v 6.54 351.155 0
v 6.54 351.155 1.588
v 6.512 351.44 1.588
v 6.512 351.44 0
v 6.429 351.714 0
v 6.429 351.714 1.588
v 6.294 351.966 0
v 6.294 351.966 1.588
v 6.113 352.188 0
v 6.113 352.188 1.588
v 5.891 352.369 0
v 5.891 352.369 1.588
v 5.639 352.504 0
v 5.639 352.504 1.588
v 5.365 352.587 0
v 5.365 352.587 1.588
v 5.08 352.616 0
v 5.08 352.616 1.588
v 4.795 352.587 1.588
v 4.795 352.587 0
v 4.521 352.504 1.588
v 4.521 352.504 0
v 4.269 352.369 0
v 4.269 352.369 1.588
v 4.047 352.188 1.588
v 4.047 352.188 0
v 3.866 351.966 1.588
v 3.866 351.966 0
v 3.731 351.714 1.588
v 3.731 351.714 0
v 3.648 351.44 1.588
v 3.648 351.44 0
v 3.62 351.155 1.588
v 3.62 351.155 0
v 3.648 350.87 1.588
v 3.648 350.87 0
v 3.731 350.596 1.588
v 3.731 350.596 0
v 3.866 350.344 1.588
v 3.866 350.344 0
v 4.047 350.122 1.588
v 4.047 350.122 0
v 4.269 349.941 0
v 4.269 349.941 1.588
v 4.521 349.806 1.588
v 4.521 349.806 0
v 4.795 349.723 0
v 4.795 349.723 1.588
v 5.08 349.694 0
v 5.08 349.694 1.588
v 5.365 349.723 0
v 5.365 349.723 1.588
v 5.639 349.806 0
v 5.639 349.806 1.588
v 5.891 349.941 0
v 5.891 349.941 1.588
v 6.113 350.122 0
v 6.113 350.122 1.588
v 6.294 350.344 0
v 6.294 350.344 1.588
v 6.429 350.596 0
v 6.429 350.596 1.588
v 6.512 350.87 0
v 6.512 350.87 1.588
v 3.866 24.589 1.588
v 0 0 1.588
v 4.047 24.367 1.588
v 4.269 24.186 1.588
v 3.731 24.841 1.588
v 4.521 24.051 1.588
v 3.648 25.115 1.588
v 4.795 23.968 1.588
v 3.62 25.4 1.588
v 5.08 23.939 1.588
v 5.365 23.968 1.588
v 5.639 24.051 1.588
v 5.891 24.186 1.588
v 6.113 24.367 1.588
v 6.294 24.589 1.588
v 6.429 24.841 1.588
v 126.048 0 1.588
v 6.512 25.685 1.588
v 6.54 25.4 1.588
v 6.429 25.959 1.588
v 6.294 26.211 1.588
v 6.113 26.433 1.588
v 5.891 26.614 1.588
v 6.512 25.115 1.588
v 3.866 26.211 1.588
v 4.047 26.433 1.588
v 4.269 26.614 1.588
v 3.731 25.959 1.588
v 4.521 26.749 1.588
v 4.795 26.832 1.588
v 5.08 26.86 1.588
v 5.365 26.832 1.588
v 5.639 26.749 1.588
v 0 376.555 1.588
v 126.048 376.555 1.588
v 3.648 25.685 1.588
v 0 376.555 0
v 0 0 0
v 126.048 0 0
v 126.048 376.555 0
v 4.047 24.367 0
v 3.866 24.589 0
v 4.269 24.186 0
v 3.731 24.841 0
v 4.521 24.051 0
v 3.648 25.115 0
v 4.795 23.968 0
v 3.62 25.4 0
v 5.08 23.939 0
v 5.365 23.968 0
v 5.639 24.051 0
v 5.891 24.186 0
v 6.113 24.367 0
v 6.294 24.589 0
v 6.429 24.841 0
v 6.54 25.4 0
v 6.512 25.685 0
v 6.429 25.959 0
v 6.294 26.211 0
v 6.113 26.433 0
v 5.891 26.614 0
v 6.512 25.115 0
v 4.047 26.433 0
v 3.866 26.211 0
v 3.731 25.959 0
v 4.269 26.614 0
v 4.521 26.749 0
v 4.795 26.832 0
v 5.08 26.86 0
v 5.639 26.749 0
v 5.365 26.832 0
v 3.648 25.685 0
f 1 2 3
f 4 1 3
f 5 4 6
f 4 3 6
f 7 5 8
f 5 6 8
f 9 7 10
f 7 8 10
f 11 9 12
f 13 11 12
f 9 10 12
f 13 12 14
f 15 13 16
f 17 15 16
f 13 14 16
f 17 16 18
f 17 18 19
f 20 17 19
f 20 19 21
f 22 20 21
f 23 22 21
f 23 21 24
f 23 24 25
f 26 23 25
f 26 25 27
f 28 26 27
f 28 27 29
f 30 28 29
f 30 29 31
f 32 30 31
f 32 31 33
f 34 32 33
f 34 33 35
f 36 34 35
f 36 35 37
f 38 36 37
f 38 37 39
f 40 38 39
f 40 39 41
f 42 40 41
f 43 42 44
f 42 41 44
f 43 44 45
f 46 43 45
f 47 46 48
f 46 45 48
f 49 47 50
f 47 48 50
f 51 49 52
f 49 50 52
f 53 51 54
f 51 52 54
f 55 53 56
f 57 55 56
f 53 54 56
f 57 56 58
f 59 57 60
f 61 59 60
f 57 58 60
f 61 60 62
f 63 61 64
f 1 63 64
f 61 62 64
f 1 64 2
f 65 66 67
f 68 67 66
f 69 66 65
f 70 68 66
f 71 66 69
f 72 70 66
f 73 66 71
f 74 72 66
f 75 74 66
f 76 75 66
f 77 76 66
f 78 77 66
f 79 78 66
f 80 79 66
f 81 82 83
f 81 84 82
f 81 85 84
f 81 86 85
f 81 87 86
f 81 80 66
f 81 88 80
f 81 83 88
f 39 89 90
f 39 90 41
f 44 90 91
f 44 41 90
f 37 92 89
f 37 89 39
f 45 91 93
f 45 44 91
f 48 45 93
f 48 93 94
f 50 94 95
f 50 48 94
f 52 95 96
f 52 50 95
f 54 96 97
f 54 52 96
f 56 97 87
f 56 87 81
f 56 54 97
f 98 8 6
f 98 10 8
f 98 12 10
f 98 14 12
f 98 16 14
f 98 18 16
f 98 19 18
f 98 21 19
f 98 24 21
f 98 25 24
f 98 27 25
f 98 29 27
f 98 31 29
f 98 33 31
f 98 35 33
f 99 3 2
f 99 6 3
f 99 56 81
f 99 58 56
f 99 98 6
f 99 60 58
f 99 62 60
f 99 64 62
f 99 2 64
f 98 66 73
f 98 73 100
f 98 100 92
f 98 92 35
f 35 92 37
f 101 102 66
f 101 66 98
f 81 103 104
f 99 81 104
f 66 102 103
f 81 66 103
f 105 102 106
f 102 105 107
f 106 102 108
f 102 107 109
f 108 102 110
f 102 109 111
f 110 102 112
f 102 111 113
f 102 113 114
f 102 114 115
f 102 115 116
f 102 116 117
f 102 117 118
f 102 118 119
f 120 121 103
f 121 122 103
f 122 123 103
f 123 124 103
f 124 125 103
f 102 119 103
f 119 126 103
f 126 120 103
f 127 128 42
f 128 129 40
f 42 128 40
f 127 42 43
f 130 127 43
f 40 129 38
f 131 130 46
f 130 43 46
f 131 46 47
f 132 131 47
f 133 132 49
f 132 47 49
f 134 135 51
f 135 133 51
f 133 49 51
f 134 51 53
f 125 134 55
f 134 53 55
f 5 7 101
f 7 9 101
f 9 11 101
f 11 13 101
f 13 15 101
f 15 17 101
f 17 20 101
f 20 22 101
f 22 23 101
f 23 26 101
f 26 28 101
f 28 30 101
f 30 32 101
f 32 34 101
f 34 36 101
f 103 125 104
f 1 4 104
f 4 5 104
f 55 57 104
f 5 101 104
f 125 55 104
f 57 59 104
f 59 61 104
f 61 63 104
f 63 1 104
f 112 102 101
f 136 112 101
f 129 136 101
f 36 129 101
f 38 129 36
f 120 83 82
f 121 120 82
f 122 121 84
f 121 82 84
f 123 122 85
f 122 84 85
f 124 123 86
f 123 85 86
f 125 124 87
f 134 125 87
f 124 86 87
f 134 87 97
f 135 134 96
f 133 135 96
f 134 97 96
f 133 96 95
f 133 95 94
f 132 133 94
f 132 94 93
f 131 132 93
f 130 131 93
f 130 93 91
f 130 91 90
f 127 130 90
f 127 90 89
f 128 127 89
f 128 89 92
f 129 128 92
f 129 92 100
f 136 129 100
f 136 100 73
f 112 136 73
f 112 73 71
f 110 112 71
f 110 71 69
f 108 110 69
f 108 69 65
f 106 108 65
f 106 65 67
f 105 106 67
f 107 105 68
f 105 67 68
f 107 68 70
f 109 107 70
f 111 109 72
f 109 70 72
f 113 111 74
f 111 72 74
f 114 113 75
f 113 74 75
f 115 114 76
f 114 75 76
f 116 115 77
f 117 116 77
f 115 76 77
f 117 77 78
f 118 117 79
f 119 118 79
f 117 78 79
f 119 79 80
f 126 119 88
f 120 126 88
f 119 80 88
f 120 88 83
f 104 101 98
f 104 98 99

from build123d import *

# Parameters (mm, degrees)
SKETCH1_W           = 126.0475
SKETCH1_H           = 376.555
BOSS_EXTRUDE1_DEPTH = 1.5875
SKETCH2_R           = 1.4605
CUT_EXTRUDE1_DEPTH  = 6.35
LPATTERN1_COUNT     = 2
LPATTERN1_PITCH     = 325.755


with BuildPart() as part:
    # Sketch1 → Boss-Extrude1 (new body)
    with BuildSketch(Plane.XY):
        with Locations((63.02375, 188.2775)):
            Rectangle(SKETCH1_W, SKETCH1_H)
    extrude(amount=BOSS_EXTRUDE1_DEPTH)

    # Sketch2 → Cut-Extrude1 (cut)
    with BuildSketch(Plane.XY.offset(1.5875)):
        with Locations((5.08, 351.155)):
            Circle(SKETCH2_R)
    cut_extrude1 = extrude(amount=-CUT_EXTRUDE1_DEPTH, mode=Mode.SUBTRACT)

    # LPattern1: Cut-Extrude1 ×2
    with Locations(*[(0, -i * LPATTERN1_PITCH, 0) for i in range(1, LPATTERN1_COUNT)]):
        add(cut_extrude1, mode=Mode.SUBTRACT)


solid = part.part
